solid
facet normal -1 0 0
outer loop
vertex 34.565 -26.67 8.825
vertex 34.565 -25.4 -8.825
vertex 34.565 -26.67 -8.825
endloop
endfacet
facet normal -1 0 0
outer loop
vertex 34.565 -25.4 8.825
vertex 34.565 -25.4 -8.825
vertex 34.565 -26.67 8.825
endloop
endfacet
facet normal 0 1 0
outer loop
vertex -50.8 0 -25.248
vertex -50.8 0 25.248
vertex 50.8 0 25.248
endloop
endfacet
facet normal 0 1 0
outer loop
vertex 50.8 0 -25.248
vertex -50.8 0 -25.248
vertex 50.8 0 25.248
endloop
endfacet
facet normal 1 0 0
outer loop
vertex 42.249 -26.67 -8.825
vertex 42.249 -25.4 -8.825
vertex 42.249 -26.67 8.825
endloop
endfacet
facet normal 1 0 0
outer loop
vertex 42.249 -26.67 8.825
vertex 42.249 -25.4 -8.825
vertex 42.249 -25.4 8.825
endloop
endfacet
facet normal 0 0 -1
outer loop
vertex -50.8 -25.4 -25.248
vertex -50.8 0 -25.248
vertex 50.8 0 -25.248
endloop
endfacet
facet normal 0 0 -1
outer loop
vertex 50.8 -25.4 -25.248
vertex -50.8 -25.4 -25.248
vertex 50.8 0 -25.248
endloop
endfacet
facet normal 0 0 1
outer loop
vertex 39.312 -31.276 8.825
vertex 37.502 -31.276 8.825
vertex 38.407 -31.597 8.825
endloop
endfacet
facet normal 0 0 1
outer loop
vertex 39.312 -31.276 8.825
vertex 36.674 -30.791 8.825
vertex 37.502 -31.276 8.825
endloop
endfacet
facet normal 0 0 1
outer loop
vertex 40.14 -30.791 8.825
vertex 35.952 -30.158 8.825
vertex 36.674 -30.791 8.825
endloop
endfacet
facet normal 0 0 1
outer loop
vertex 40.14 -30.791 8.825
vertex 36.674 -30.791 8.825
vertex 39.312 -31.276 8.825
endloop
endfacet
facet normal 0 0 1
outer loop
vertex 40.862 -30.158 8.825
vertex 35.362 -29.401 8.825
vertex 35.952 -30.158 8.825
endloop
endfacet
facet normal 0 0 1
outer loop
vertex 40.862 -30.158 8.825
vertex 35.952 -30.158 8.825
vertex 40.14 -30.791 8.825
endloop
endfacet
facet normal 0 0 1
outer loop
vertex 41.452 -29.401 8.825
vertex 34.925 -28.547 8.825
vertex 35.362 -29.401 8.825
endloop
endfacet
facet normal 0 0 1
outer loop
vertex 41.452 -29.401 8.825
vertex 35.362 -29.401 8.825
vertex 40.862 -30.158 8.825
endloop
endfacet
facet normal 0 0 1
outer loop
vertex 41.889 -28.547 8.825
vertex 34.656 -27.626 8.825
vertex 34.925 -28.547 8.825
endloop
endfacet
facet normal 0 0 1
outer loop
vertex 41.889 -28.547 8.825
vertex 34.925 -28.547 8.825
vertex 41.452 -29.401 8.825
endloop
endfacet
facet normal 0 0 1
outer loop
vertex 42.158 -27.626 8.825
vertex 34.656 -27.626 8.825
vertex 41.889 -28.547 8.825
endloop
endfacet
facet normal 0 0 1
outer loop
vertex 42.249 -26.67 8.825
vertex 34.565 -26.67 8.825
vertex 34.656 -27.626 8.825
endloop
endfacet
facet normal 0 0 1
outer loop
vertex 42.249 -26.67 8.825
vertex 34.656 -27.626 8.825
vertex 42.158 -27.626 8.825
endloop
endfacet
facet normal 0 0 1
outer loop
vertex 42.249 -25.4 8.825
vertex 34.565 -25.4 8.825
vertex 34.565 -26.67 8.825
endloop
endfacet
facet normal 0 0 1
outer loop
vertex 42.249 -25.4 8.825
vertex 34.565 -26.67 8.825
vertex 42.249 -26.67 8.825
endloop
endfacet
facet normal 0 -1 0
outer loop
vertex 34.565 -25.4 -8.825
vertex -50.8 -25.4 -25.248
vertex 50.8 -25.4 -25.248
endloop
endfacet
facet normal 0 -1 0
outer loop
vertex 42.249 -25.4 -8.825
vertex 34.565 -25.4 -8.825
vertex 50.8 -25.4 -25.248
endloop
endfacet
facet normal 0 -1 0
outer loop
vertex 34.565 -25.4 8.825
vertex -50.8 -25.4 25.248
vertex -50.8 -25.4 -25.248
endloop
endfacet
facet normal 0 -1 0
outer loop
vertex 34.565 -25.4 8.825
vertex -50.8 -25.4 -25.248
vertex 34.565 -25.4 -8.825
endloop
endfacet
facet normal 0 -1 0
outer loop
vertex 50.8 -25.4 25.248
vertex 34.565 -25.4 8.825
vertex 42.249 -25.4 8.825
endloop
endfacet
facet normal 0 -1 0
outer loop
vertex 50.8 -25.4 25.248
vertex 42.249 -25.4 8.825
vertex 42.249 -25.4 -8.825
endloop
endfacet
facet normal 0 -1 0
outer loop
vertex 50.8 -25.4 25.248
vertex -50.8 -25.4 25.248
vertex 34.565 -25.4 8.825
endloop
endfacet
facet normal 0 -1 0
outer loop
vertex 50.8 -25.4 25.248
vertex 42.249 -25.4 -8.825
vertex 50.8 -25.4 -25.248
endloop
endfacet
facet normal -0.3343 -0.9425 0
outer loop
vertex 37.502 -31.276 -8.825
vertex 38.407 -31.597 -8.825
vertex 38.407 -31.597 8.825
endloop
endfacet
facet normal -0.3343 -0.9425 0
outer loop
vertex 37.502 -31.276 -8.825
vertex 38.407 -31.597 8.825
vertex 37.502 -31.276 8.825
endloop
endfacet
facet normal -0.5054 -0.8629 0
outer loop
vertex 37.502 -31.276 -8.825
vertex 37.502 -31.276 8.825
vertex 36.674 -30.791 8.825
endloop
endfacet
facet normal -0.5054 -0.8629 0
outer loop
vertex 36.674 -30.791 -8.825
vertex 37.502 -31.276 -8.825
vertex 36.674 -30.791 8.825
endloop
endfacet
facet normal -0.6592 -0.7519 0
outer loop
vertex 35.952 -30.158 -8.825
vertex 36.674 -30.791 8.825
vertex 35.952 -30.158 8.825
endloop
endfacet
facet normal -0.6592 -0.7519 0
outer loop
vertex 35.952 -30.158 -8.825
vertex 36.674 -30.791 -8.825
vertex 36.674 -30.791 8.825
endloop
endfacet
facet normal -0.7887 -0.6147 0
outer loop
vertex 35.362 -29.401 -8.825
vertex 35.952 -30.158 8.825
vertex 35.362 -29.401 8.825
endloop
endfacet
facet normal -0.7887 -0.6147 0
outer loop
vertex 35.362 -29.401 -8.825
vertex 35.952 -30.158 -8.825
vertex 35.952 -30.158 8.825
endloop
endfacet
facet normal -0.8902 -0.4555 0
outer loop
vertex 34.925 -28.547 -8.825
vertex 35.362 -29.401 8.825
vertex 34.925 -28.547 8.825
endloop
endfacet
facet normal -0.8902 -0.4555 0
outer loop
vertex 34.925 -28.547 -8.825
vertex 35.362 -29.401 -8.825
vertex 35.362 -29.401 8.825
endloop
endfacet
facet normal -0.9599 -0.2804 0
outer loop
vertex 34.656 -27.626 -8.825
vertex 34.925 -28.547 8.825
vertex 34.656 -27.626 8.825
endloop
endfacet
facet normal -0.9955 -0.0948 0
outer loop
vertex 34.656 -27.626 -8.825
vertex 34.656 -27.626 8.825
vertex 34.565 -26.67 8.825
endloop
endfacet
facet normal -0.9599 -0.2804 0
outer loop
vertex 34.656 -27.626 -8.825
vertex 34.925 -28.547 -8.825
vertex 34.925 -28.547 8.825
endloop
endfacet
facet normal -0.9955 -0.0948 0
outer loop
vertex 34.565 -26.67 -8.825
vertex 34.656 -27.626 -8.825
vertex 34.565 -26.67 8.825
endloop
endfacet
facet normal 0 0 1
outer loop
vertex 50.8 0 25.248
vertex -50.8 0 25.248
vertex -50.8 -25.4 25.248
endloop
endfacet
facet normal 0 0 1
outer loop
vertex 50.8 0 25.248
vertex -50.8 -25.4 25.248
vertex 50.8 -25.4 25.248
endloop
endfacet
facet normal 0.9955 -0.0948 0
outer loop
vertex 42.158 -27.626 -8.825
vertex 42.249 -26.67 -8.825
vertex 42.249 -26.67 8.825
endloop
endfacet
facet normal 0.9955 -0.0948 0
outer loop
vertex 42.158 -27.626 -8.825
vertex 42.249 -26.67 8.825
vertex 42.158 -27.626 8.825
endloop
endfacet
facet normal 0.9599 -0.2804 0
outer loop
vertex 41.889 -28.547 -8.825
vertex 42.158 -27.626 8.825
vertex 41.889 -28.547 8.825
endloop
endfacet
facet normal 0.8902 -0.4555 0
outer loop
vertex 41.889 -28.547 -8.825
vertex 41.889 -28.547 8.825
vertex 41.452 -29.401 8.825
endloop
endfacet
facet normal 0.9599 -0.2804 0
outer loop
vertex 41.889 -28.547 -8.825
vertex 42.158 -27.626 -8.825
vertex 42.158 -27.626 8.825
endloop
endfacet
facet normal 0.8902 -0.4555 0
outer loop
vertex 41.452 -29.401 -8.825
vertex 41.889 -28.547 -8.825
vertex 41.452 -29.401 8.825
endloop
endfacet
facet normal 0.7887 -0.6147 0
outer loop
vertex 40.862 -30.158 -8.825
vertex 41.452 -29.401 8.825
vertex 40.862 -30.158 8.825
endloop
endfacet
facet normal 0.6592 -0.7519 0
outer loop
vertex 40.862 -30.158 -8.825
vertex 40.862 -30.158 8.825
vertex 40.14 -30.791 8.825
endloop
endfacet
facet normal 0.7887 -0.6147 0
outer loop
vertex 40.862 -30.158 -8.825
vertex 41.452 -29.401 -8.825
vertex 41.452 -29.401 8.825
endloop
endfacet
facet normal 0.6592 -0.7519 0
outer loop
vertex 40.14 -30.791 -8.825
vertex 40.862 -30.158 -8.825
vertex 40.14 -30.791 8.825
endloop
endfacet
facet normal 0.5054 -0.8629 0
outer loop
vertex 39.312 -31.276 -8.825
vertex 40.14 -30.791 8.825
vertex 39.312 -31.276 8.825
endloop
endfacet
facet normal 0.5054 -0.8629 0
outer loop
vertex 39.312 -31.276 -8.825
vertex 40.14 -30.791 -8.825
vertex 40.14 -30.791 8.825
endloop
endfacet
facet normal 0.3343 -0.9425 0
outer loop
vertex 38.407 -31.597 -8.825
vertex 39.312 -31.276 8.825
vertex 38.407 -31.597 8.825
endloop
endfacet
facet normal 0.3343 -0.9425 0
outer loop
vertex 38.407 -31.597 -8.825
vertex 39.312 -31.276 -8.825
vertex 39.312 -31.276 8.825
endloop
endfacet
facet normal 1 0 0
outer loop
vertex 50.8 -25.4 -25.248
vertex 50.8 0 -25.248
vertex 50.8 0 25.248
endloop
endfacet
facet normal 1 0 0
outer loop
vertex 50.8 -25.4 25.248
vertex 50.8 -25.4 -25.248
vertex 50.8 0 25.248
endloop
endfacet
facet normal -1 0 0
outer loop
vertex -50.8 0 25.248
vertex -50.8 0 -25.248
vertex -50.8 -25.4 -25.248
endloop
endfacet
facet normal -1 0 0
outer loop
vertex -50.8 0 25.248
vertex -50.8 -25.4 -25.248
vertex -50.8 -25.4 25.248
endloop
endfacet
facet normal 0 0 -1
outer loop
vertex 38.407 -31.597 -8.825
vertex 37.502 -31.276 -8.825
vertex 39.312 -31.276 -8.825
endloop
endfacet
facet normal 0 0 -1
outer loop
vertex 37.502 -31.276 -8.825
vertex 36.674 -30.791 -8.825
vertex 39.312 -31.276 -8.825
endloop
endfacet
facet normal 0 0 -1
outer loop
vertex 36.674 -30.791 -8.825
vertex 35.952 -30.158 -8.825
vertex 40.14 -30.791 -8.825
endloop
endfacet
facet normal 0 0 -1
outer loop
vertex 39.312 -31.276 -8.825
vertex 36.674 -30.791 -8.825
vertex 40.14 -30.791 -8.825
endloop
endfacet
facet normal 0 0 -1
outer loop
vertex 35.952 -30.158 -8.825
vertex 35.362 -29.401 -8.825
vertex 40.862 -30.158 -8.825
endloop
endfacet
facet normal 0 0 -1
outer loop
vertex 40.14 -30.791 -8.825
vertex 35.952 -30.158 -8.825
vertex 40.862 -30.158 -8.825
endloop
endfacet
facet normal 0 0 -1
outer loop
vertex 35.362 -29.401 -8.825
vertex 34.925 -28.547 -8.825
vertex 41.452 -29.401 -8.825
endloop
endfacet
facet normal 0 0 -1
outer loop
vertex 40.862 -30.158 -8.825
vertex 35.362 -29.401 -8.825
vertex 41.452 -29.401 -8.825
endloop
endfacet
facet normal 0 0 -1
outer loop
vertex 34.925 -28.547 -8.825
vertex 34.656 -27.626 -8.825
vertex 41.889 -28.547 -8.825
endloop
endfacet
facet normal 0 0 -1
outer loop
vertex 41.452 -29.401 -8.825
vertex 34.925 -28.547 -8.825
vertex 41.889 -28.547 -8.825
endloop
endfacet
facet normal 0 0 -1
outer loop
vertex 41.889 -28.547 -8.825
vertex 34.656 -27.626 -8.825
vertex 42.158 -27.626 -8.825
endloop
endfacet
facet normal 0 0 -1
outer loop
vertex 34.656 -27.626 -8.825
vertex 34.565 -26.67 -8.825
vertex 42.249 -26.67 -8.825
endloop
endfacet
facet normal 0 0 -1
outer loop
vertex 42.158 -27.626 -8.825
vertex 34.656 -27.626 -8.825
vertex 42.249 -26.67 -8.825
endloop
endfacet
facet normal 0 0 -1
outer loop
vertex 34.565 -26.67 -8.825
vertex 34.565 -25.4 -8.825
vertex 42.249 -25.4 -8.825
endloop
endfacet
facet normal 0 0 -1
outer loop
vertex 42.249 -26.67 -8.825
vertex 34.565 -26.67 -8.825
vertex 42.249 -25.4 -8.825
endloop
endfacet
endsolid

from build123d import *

# Parameters (mm, degrees)
F0_W        = 7.6837688684
F0_H        = 17.6492575556
F1_DEPTH    = 31.75
F0_W_2      = 101.6
F0_H_2      = 50.4952
F2_DEPTH    = 25.4
F3_T1_DEPTH = 43.0492575556


# Not quite as in the source:
# - a fillet or chamfer that OpenCascade refuses, or shapes differently, is made with other operations: its cross-section is extruded or revolved along the edge and cut away or added


with BuildPart() as f1:
    # F0 (on Front) → F1 (new body)
    with BuildSketch(Plane.XZ):
        with Locations((38.4069420397, 0)):
            Rectangle(F0_W, F0_H)
    extrude(amount=F1_DEPTH)

    # F0 (on Front) → F2 (join)
    with BuildSketch(Plane.XZ):
        Rectangle(F0_W_2, F0_H_2)
        with Locations((38.4069420397, 0)):
            Rectangle(F0_W, F0_H, mode=Mode.SUBTRACT)
    extrude(amount=F2_DEPTH)

    # F3: fillet of radius 5.08 on 2 edges, made by hand

    # F3_s2 → F3_t1 (cut)
    with BuildSketch(Plane.XY.offset(-21.5246287778)):
        with BuildLine():
            ThreePointArc((42.248826474, -26.67), (40.7609289224, -30.2621024484), (37.168826474, -31.75))
            Line((37.168826474, -31.75), (42.248826474, -31.75))
            Line((42.248826474, -31.75), (42.248826474, -26.67))
        make_face()
        with BuildLine():
            ThreePointArc((39.6450576055, -31.75), (36.0529551571, -30.2621024484), (34.5650576055, -26.67))
            Line((34.5650576055, -26.67), (34.5650576055, -31.75))
            Line((34.5650576055, -31.75), (39.6450576055, -31.75))
        make_face()
    extrude(amount=F3_T1_DEPTH, mode=Mode.SUBTRACT)


solid = f1.part
